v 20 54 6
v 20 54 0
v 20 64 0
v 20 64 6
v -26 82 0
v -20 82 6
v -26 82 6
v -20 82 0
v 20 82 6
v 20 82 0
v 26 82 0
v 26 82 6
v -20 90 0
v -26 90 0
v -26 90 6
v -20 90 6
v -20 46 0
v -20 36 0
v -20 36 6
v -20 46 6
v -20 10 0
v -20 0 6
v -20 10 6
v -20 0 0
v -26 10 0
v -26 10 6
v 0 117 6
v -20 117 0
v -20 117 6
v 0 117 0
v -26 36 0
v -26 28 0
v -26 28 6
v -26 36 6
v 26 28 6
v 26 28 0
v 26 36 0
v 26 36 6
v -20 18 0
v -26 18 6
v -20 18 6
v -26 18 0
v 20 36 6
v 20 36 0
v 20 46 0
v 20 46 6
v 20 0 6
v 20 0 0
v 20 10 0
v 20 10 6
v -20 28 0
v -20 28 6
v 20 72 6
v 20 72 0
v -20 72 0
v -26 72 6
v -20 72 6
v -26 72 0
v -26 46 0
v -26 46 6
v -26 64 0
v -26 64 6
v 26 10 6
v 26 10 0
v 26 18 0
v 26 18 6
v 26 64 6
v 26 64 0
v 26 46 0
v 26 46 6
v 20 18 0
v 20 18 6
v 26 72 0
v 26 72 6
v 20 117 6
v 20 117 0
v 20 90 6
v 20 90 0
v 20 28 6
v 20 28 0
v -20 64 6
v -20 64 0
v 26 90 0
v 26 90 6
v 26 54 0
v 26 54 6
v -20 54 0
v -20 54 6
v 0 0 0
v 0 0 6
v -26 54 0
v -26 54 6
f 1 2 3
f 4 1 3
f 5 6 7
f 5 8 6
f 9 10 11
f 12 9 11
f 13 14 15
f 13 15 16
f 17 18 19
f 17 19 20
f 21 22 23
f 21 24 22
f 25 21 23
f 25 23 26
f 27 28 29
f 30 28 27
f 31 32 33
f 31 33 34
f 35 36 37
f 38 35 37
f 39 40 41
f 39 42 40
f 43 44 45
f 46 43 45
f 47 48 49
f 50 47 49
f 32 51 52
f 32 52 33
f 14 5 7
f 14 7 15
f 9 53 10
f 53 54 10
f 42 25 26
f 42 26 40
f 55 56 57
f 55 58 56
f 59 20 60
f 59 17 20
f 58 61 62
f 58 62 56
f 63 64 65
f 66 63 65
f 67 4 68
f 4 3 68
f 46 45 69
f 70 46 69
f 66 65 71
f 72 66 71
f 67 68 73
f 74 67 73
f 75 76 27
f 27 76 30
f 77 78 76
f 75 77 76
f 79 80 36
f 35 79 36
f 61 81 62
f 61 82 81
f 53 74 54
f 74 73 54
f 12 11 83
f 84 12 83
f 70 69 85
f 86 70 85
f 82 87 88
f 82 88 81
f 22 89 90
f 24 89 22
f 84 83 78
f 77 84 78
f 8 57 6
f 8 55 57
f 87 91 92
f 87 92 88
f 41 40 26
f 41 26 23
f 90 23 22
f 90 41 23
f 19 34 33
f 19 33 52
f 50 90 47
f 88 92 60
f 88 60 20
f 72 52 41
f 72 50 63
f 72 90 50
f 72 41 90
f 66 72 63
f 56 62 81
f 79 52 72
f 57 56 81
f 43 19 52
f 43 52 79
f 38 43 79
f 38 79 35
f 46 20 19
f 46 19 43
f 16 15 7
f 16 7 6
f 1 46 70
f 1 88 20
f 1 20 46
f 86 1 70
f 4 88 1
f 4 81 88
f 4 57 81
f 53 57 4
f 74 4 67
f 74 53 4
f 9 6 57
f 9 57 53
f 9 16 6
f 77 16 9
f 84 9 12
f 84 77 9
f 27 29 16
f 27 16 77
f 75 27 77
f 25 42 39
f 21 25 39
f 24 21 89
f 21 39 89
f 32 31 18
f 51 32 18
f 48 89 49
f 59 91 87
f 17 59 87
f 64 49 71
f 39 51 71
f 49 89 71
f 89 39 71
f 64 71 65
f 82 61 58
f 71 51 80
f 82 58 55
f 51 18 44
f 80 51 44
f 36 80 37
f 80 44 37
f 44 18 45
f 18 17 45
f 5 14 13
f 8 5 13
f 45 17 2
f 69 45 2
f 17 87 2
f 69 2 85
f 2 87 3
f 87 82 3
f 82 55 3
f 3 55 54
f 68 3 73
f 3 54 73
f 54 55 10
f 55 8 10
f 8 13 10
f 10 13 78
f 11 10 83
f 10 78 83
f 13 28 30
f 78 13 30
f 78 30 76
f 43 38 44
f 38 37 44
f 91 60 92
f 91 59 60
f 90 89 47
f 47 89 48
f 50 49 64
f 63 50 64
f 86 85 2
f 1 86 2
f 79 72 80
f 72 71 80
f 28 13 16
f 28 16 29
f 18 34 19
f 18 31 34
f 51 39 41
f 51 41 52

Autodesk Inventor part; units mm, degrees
ref_plane "YZ Plane" through (0, 0, 0) normal (1, 0, 0) x (0, 1, 0)
ref_plane "XZ Plane" through (0, 0, 0) normal (0, 1, 0) x (-1, 0, 0)
ref_plane "XY Plane" through (0, 0, 0) normal (0, 0, 1) x (1, 0, 0)
sketch "Sketch1" plane through (0, 0, 0) normal (0, 0, 1) x (1, 0, 0)
  line L0 (0, 0) -> (-20, 0)
  line L1 (-20, 0) -> (-20, 10)
  line L2 (-20, 10) -> (-26, 10)
  line L3 (-26, 10) -> (-26, 18)
  line L4 (-26, 18) -> (-20, 18)
  line L5 (-20, 18) -> (-20, 28)
  line L6 (-20, 28) -> (-26, 28)
  line L7 (-26, 28) -> (-26, 36)
  line L8 (-26, 36) -> (-20, 36)
  line L9 (-20, 36) -> (-20, 46)
  line L10 (-20, 46) -> (-26, 46)
  line L11 (-26, 46) -> (-26, 54)
  line L12 (-26, 54) -> (-20, 54)
  line L13 (-20, 54) -> (-20, 64)
  line L14 (-20, 64) -> (-26, 64)
  line L15 (-26, 64) -> (-26, 72)
  line L16 (-26, 72) -> (-20, 72)
  line L17 (-20, 72) -> (-20, 82)
  line L18 (-20, 82) -> (-26, 82)
  line L19 (-26, 82) -> (-26, 90)
  line L20 (-26, 90) -> (-20, 90)
  line L21 (-20, 90) -> (-20, 117)
  line L22 (-20, 117) -> (0, 117)
  line L23 (0, 117) -> (0, 0) construction
  line L24 (0, 0) -> (20, 0)
  line L25 (20, 0) -> (20, 10)
  line L26 (20, 10) -> (26, 10)
  line L27 (26, 10) -> (26, 18)
  line L28 (26, 18) -> (20, 18)
  line L29 (20, 18) -> (20, 28)
  line L30 (26, 28) -> (26, 36)
  line L31 (26, 36) -> (20, 36)
  line L32 (20, 36) -> (20, 46)
  line L33 (20, 46) -> (26, 46)
  line L34 (26, 46) -> (26, 54)
  line L35 (26, 54) -> (20, 54)
  line L36 (20, 54) -> (20, 64)
  line L37 (20, 64) -> (26, 64)
  line L38 (26, 64) -> (26, 72)
  line L39 (26, 72) -> (20, 72)
  line L40 (20, 72) -> (20, 82)
  line L41 (20, 82) -> (26, 82)
  line L42 (26, 82) -> (26, 90)
  line L43 (26, 90) -> (20, 90)
  line L44 (20, 90) -> (20, 117)
  line L45 (20, 117) -> (0, 117)
  line L46 (20, 28) -> (26, 28)
  point P0 (-23, 90)
  dimension "d18" = 20
  dimension "d20" = 6
  dimension "d21" = 8
  dimension "d22" = 10
  dimension "d23" = 6
  dimension "d24" = 8
  dimension "d25" = 117
  dimension "d33" = 8
  dimension "d34" = 8
  dimension "d35" = 8
  dimension "d36" = 10
  dimension "d37" = 10
  dimension "d38" = 10
  dimension "d39" = 20
  dimension "d42" = 90
extrude "Extrusion1" add sketch "Sketch1" along normal blind 6
properties part number "sort support wall 2"
